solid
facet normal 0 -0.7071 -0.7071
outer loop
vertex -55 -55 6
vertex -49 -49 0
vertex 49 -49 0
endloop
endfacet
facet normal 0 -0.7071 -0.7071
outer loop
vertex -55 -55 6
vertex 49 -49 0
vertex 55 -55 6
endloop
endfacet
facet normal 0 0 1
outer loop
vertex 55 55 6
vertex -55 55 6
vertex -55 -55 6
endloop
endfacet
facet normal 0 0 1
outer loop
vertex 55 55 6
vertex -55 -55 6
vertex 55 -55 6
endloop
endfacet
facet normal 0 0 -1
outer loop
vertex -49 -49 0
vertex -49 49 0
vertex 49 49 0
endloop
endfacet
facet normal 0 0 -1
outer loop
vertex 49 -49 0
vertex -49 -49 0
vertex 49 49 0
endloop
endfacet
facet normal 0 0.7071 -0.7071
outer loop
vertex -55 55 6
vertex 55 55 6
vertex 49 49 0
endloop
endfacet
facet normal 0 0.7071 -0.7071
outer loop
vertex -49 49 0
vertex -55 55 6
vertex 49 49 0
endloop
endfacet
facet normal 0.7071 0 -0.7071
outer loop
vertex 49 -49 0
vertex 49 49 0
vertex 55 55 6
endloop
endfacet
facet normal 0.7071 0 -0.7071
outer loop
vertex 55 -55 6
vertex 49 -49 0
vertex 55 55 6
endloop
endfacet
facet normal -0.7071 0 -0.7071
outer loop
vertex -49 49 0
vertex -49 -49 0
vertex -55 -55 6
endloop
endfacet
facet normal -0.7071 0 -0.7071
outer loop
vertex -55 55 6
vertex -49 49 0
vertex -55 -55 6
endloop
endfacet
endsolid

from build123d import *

# Parameters (mm, degrees)
SKETCH_W        = 110
SKETCH_H        = 110
PAD_DEPTH       = 6
POCKET_DEPTH    = 110
POCKET001_DEPTH = 110


with BuildPart() as part:
    # Sketch → Pad (new body)
    with BuildSketch(Plane.XY):
        Rectangle(SKETCH_W, SKETCH_H)
    extrude(amount=PAD_DEPTH)

    # Sketch002 (on Face3 of Pad) → Pocket (cut)
    with BuildSketch(Plane.XZ.offset(55)):
        Polygon((55, 6), (55, 0), (49, 0), align=None)
        Polygon((-55, 6), (-55, 0), (-49, 0), align=None)
    extrude(amount=-POCKET_DEPTH, mode=Mode.SUBTRACT)

    # Sketch001 (on Face2 of Pad) → Pocket001 (cut)
    with BuildSketch(Plane.YZ.offset(55)):
        Polygon((-55, 6), (-55, 0), (-49, 0), align=None)
        Polygon((55, 6), (49, 0), (55, 0), align=None)
    extrude(amount=-POCKET001_DEPTH, mode=Mode.SUBTRACT)


solid = part.part
